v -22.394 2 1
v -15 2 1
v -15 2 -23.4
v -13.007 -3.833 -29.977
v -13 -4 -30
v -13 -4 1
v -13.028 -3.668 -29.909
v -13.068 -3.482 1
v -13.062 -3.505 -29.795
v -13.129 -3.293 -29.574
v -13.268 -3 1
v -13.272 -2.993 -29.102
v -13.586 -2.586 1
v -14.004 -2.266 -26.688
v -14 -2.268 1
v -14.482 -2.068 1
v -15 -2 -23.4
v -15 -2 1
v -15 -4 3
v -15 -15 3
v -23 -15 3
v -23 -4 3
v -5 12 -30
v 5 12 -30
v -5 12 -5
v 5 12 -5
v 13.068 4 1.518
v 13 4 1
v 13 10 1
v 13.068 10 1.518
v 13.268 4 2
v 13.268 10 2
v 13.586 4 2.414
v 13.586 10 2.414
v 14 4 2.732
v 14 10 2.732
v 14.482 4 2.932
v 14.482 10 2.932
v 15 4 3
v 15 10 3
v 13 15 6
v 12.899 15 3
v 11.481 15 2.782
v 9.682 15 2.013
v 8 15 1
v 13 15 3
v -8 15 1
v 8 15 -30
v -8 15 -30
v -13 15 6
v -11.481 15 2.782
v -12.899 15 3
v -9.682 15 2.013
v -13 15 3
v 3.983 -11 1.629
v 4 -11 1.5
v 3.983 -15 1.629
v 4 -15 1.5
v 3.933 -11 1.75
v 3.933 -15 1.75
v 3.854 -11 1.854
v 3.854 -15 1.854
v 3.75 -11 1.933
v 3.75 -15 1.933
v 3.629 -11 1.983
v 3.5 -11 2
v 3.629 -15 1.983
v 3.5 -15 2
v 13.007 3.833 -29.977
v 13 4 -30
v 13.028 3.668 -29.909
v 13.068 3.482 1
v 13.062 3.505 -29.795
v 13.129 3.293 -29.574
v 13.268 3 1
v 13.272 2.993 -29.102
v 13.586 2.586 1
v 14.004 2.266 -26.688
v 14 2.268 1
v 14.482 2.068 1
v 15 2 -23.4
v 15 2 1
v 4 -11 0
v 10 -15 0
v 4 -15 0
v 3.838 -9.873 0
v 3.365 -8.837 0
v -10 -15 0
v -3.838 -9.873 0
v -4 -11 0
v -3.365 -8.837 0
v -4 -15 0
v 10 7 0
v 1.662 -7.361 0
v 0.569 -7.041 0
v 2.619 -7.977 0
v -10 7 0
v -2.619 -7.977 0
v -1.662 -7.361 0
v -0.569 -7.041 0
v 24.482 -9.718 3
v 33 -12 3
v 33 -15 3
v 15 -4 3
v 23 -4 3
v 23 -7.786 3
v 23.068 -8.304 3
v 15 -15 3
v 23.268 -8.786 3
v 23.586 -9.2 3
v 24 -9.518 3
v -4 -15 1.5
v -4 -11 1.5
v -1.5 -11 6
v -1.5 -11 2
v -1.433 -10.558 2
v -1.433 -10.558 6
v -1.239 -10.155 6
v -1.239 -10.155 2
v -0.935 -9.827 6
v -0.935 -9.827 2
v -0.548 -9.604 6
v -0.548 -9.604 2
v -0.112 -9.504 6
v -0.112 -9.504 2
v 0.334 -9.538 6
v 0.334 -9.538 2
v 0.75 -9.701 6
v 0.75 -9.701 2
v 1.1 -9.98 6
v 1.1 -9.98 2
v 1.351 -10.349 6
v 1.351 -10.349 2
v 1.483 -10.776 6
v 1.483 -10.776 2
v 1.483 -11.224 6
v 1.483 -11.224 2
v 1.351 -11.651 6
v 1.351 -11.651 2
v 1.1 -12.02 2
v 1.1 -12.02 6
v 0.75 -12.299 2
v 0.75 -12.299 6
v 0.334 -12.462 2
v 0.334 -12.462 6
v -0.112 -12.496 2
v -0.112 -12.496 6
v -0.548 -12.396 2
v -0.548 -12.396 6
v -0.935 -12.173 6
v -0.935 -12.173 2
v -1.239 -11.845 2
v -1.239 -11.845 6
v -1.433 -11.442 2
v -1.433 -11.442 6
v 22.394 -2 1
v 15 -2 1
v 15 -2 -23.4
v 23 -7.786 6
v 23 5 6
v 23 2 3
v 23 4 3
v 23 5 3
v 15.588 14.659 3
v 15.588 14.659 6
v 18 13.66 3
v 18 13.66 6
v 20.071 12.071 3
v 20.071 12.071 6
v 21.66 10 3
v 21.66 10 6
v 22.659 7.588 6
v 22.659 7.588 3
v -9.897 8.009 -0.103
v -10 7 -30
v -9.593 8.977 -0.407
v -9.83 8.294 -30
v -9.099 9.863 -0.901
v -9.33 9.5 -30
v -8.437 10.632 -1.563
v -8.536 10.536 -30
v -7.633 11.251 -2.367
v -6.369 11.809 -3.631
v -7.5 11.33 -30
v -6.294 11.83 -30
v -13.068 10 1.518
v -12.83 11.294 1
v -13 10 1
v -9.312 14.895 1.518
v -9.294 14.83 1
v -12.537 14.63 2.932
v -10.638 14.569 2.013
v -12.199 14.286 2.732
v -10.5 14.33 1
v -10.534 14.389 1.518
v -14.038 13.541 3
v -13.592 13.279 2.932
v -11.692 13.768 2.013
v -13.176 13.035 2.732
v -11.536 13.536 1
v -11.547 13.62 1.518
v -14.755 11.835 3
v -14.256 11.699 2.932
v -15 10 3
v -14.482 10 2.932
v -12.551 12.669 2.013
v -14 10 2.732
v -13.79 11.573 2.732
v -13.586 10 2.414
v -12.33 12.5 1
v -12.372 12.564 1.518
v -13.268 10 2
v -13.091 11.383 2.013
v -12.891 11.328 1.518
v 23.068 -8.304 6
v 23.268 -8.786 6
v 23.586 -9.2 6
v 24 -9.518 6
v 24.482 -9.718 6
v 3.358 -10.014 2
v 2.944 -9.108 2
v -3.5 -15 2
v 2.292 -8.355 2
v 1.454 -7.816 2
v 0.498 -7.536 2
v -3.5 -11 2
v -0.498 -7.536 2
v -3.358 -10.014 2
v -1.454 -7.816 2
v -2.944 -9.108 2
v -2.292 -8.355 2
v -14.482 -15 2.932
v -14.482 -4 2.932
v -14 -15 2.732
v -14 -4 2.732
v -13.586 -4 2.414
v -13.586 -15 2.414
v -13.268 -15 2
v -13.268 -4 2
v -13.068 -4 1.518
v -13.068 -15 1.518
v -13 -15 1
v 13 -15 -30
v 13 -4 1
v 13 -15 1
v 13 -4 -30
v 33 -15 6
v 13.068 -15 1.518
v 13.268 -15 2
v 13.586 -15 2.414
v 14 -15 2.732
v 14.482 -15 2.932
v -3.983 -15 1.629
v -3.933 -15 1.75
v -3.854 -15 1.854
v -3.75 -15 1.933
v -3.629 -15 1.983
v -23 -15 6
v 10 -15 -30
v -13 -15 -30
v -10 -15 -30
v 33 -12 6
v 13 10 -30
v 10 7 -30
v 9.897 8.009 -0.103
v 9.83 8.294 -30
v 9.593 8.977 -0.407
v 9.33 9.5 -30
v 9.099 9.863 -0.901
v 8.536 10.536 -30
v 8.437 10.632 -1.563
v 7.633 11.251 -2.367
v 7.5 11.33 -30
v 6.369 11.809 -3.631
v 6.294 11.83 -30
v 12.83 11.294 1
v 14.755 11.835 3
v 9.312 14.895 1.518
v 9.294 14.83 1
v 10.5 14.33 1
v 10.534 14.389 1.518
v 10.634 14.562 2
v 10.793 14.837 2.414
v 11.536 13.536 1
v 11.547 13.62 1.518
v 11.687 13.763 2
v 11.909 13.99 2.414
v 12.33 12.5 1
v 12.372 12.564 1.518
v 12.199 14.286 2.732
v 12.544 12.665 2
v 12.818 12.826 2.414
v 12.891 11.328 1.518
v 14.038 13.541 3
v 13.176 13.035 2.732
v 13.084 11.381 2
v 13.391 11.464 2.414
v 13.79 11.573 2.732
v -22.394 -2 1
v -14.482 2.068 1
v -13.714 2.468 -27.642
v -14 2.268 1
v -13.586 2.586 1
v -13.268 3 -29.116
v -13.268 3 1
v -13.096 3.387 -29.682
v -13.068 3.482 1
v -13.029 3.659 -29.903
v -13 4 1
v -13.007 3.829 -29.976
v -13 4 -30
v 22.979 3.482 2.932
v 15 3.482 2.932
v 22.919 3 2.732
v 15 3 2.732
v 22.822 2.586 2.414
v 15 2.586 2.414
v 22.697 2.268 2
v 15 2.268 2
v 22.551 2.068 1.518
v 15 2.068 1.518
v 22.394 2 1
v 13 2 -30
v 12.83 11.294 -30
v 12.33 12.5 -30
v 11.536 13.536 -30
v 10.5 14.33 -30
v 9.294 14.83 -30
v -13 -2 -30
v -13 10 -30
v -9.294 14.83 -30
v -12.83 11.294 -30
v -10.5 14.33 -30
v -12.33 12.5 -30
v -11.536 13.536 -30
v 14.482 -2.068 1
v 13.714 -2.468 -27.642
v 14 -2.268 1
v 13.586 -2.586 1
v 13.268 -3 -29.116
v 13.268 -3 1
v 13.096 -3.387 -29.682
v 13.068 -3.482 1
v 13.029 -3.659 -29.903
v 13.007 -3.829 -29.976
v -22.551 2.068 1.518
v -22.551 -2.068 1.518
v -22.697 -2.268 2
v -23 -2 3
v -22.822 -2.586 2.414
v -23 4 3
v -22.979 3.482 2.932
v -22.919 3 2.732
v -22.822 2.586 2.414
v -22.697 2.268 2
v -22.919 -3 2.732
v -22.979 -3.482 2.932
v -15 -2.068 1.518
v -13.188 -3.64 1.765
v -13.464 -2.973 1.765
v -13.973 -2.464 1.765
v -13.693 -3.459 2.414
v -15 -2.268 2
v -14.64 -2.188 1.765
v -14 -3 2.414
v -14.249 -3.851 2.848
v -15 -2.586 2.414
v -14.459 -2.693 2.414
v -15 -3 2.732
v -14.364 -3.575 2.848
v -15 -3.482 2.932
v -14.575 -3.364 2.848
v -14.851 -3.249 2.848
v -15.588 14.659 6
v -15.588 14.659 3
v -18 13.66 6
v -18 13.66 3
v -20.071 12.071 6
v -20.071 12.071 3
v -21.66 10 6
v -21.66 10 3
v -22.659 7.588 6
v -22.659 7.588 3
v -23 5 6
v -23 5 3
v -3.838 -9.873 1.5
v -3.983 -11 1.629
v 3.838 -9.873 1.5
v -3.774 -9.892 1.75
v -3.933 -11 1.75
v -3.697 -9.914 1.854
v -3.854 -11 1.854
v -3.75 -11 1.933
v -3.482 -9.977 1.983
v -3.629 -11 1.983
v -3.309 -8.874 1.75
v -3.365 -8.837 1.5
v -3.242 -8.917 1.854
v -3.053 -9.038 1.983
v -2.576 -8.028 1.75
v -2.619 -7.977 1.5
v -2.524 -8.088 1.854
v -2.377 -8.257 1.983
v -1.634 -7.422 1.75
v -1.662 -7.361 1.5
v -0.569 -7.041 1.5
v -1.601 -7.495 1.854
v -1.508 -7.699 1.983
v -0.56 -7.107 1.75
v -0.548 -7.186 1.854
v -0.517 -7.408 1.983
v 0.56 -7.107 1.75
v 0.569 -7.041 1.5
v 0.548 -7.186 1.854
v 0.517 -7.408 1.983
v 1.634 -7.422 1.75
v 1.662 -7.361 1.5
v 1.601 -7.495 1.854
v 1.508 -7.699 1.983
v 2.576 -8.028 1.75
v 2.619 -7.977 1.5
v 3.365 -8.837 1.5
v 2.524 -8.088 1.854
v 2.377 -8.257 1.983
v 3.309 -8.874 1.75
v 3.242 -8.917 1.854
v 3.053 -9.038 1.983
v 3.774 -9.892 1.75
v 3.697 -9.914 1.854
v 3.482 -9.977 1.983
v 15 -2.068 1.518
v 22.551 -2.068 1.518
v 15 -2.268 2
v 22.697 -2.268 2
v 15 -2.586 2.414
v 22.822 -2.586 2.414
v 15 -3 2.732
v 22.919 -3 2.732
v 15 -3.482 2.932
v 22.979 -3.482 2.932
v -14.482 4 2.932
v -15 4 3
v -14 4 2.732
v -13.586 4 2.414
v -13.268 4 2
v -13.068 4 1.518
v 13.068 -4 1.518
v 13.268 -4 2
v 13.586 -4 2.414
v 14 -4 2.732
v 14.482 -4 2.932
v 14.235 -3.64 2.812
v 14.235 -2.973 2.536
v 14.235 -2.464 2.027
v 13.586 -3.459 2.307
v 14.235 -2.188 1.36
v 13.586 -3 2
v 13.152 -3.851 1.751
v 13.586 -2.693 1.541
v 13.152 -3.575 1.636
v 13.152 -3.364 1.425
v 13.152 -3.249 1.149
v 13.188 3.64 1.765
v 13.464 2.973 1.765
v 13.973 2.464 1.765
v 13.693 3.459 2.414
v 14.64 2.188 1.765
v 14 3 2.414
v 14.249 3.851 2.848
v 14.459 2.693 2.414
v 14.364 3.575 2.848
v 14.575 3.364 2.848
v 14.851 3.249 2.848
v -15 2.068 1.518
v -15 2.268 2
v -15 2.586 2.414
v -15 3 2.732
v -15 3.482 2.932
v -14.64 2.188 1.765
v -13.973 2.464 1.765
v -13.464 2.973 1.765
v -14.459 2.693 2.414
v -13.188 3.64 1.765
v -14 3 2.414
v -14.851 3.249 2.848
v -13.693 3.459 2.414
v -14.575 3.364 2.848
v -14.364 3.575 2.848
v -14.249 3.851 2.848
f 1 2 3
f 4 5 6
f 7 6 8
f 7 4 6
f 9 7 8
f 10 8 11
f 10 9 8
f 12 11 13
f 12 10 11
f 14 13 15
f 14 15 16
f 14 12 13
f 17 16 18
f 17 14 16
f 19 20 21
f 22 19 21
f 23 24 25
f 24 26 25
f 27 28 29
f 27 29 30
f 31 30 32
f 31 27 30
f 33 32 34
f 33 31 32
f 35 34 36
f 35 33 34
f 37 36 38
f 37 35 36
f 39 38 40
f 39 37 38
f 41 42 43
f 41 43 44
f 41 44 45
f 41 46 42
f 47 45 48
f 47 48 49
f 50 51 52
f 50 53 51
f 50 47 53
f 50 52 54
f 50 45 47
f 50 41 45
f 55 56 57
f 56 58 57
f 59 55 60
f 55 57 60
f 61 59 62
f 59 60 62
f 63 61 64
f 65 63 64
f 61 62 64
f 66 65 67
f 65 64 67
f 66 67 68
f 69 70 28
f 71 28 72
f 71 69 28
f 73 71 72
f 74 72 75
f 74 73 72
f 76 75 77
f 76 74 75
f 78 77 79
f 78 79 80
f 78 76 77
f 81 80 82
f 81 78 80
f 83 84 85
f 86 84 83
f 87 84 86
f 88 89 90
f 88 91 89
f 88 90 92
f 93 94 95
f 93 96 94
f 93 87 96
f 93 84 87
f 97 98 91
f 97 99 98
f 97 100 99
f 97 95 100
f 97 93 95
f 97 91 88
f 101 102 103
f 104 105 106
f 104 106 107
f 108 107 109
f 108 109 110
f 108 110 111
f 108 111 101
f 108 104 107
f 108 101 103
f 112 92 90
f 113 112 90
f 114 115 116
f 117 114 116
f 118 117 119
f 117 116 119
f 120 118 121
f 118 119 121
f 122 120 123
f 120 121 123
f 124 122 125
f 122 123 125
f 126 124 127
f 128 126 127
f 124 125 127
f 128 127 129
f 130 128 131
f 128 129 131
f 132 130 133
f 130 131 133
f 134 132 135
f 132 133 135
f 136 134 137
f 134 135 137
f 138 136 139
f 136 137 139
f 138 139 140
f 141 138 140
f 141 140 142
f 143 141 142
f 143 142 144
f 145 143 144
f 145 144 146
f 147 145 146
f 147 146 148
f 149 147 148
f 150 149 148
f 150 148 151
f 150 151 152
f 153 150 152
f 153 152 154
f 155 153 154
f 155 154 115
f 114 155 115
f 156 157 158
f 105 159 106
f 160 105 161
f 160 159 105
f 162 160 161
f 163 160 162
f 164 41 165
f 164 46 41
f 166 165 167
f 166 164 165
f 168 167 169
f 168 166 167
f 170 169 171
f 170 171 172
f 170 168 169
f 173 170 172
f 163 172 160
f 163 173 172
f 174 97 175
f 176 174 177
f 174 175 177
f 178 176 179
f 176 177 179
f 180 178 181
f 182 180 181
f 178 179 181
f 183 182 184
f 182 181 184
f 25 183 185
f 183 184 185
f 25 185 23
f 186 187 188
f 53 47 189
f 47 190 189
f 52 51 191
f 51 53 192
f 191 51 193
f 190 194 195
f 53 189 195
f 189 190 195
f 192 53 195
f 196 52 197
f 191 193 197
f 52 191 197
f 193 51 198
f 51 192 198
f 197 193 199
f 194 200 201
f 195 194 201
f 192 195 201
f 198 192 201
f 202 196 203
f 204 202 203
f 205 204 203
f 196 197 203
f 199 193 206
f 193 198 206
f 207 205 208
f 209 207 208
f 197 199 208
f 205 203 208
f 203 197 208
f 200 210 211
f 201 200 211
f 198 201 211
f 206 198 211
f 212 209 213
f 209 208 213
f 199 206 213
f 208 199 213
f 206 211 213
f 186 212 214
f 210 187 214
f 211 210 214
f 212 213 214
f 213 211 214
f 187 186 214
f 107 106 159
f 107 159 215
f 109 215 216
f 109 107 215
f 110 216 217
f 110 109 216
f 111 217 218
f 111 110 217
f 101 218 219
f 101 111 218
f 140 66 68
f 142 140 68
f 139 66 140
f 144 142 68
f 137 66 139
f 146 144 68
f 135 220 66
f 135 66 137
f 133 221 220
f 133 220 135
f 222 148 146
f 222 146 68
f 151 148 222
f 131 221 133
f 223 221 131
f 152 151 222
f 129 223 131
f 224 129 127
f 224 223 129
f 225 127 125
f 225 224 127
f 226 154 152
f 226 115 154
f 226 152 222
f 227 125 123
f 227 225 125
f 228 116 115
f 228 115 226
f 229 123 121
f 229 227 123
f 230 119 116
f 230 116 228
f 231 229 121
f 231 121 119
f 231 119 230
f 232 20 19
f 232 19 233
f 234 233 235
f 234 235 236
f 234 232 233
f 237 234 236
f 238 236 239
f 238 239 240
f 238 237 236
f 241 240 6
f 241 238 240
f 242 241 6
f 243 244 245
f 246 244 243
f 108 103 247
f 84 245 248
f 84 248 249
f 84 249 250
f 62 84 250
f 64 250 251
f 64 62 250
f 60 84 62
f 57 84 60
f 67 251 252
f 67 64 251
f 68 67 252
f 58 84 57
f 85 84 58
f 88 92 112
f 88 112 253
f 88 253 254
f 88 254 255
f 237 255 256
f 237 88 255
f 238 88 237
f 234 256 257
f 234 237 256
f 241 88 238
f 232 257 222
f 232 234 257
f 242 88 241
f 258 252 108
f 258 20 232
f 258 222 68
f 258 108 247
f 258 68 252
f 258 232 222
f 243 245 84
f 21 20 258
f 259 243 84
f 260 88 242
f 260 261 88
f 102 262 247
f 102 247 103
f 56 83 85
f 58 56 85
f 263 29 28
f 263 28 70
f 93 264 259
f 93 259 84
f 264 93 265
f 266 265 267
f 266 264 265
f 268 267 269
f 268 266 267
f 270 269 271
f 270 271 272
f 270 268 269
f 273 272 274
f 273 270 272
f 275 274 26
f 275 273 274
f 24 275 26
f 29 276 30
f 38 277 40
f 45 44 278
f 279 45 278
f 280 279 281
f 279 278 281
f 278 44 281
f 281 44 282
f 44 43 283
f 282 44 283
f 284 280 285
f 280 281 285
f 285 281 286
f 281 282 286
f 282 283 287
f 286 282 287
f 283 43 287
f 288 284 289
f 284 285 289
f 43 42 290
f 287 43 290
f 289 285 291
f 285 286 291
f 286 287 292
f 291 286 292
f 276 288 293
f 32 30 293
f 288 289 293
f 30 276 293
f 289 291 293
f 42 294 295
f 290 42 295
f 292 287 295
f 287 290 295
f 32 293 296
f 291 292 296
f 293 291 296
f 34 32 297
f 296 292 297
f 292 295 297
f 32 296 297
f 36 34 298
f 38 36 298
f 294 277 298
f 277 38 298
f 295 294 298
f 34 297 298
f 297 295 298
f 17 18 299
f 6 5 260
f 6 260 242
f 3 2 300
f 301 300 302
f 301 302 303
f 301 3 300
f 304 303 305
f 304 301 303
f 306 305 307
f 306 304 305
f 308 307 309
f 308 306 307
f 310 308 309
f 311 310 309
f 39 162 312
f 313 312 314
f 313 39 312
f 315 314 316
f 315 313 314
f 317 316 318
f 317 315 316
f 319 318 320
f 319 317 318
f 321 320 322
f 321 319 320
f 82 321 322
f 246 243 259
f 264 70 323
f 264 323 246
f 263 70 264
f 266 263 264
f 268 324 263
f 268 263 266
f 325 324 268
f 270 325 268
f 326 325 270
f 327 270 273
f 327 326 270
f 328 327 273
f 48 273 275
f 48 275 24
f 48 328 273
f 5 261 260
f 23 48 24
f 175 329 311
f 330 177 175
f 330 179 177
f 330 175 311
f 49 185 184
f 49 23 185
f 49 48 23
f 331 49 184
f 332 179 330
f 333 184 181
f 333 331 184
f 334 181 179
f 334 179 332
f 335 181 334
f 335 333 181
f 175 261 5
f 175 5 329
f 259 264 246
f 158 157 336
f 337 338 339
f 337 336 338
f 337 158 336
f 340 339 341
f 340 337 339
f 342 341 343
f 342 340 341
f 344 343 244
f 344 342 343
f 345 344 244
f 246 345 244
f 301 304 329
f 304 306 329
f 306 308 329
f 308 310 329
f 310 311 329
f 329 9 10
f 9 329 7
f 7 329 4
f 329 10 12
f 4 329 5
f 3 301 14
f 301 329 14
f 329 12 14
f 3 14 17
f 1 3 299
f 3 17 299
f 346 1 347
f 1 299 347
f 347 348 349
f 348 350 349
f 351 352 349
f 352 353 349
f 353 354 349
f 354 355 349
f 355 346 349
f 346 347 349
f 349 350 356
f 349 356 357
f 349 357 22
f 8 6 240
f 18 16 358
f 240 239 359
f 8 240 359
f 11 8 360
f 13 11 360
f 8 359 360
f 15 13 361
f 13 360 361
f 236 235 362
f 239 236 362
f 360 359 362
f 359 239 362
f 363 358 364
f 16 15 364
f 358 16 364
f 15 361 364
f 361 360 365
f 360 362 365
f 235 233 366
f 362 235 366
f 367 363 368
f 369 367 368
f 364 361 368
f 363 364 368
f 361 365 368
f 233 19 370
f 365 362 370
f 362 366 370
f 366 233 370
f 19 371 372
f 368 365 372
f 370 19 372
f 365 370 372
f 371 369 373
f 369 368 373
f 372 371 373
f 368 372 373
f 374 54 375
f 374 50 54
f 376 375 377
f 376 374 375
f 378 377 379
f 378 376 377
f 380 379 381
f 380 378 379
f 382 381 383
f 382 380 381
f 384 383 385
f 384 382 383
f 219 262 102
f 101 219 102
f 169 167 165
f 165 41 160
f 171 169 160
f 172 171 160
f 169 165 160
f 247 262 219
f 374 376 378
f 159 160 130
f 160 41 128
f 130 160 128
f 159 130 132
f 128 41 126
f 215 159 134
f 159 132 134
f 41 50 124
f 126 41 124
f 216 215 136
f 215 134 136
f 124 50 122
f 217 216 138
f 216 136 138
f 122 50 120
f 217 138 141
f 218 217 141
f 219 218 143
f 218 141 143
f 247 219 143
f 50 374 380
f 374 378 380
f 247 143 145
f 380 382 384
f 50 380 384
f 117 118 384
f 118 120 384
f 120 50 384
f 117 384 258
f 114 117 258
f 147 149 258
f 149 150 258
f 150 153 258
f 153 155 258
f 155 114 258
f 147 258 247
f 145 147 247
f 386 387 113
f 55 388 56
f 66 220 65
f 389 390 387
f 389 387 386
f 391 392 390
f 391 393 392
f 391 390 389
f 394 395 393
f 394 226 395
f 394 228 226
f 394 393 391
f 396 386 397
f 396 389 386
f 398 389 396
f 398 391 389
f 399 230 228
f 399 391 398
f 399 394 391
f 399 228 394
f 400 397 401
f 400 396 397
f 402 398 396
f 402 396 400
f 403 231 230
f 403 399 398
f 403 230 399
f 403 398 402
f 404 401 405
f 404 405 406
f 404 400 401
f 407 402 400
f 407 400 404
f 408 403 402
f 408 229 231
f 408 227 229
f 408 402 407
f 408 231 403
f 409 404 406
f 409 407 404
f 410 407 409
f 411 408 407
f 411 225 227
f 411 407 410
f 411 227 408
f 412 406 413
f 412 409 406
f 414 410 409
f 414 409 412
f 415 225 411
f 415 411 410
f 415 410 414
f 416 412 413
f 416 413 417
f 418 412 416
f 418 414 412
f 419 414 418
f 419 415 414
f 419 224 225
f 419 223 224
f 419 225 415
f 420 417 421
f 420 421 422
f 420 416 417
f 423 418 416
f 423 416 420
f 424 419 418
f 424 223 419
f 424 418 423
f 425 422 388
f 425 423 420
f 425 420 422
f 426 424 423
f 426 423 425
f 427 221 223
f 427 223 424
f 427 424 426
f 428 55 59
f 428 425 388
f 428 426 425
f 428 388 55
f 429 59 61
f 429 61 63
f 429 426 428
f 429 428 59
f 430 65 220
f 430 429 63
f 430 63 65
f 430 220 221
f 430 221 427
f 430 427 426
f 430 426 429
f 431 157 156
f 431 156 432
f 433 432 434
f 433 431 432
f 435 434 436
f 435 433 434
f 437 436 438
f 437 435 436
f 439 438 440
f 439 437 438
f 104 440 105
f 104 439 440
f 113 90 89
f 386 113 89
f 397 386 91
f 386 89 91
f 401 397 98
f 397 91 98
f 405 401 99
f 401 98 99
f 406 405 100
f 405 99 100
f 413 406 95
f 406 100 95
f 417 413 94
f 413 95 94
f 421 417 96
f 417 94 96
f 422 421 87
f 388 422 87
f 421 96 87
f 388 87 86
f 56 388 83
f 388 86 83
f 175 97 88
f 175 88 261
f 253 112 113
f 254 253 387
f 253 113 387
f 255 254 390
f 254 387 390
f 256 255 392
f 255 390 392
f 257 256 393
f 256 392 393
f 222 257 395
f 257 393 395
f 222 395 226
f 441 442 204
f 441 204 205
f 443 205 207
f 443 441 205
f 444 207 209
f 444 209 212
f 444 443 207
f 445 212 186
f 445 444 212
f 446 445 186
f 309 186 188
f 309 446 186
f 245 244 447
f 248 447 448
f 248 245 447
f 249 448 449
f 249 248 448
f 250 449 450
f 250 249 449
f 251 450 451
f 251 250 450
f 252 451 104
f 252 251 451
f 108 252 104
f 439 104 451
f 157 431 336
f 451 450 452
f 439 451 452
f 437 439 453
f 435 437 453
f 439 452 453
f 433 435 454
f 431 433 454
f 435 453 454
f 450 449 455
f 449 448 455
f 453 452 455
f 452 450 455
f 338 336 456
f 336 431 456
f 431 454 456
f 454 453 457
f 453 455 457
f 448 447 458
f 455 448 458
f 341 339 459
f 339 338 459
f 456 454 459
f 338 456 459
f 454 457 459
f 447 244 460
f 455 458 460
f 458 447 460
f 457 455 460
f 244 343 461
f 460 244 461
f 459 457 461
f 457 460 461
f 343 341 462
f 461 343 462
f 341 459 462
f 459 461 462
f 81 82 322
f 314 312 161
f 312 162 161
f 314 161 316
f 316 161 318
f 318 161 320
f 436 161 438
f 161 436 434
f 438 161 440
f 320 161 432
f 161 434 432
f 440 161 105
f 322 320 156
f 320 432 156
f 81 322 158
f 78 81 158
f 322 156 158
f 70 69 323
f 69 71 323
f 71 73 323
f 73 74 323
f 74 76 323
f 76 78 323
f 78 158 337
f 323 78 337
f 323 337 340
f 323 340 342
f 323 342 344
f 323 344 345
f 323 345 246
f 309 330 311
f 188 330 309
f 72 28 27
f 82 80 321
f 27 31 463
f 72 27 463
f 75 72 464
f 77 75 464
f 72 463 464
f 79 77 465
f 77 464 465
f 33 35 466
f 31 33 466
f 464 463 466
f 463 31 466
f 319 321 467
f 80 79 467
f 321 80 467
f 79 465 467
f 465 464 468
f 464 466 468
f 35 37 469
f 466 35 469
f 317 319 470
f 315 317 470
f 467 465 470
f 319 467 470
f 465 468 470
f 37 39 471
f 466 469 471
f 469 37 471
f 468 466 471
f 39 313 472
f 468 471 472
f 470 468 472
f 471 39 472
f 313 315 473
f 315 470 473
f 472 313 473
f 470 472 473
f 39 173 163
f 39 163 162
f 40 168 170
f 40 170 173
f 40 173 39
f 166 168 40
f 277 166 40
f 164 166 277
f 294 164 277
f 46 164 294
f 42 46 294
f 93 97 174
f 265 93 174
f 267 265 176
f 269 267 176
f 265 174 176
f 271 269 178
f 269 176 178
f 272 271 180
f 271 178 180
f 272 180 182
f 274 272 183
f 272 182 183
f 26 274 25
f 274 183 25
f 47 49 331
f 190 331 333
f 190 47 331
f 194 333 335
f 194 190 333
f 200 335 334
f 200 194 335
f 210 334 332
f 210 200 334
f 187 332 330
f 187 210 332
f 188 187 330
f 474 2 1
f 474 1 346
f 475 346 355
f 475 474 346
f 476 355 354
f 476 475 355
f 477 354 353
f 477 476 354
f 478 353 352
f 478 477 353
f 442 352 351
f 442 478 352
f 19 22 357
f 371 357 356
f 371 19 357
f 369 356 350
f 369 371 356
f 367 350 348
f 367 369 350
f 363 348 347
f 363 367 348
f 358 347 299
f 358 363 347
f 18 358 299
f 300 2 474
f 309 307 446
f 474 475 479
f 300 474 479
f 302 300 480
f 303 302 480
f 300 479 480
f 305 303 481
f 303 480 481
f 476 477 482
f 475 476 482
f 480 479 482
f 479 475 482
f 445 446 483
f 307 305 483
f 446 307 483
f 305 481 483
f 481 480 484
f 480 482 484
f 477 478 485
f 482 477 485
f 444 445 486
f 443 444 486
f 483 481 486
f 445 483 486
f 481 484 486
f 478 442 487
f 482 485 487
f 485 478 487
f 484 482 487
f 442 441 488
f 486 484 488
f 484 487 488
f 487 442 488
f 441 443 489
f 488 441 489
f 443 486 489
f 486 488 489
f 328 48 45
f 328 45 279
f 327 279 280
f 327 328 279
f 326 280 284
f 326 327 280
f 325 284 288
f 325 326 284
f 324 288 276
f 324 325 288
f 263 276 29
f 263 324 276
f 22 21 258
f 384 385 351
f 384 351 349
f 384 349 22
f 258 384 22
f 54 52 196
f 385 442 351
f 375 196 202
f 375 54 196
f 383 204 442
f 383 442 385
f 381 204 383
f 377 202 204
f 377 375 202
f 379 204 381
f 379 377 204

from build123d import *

# Parameters (mm, degrees)
BOSS_EXTRUDE1_DEPTH = 15
BOSS_EXTRUDE2_DEPTH = 2
SKETCH3_R           = 1.5
CUT_EXTRUDE1_DEPTH  = 41.669398815
FILLET1_R           = 10
CUT_EXTRUDE4_DEPTH  = 2
FILLET2_R           = 0.5
SKETCH5_W           = 20
SKETCH5_H           = 3
BOSS_EXTRUDE3_DEPTH = 30
SKETCH6_W           = 3
SKETCH6_H           = 3
BOSS_EXTRUDE4_DEPTH = 10
CHAMFER1_SIZE2      = 10
CHAMFER1_SIZE       = 2.679491924
FILLET3_R           = 5
FILLET4_R           = 2


# Some blends are built 0.0001 mm under size
with BuildPart() as part:
    # Sketch1 → Boss-Extrude1 (new, symmetric)
    with BuildSketch(Plane(origin=(0, 0, 0), x_dir=(1, 0, 0), z_dir=(0, 1, 0))):
        Polygon((10, 0), (-10, 0), (-10, 30), (-13, 30), (-13, -3), (-23, -3), (-23, -6), (23, -6), (23, -3), (13, -3), (13, 30), (10, 30), align=None)
    extrude(amount=BOSS_EXTRUDE1_DEPTH, both=True)

    # Sketch2 → Boss-Extrude2 (add, symmetric)
    with BuildSketch(Plane(origin=(0, 0, 0), x_dir=(1, 0, 0), z_dir=(0, 1, 0))):
        Polygon((13, 30), (13, -3), (23, -3), align=None)
    boss_extrude2 = extrude(amount=BOSS_EXTRUDE2_DEPTH, both=True)

    # Mirror1: Boss-Extrude2 across plane
    add(boss_extrude2.mirror(Plane(origin=(0, 0, 0), x_dir=(0, 0, 1), z_dir=(1, 0, 0))))

    # Sketch3 → Cut-Extrude1 (cut, through all)
    with BuildSketch(Plane(origin=(0, 0, 0), x_dir=(-1, 0, 0), z_dir=(0, 0, -1))):
        with Locations((0, -11)):
            Circle(SKETCH3_R)
    extrude(amount=-CUT_EXTRUDE1_DEPTH, mode=Mode.SUBTRACT)

    # Fillet1
    fillet1_edges = [part.edges().sort_by_distance(p)[0] for p in [
        (23, 15, 4.5),
        (-23, 15, 4.5),
    ]]
    fillet(fillet1_edges, radius=FILLET1_R)

    # Sketch4 → Cut-Extrude4 (cut)
    with BuildSketch(Plane(origin=(0, 0, 0), x_dir=(-1, 0, 0), z_dir=(0, 0, -1))):
        with BuildLine():
            Line((0, -15), (4, -15))
            Line((4, -15), (4, -11))
            ThreePointArc((4, -11), (0, -7), (-4, -11))
            Line((-4, -11), (-4, -15))
            Line((-4, -15), (0, -15))
        make_face()
    extrude(amount=-CUT_EXTRUDE4_DEPTH, mode=Mode.SUBTRACT)

    # Fillet2
    fillet2_edges = [part.edges().sort_by_distance(p)[0] for p in [
        (4, -13, 2),
        (0, -7, 2),
        (-4, -13, 2),
    ]]
    fillet(fillet2_edges, radius=FILLET2_R)

    # Sketch5 → Boss-Extrude3 (add)
    with BuildSketch(Plane(origin=(0, 0, 0), x_dir=(-1, 0, 0), z_dir=(0, 0, -1))):
        with Locations((0, 13.5)):
            Rectangle(SKETCH5_W, SKETCH5_H)
    extrude(amount=BOSS_EXTRUDE3_DEPTH)

    # Sketch6 → Boss-Extrude4 (add)
    with BuildSketch(Plane(origin=(23, 0, 0), x_dir=(0, 0, -1), z_dir=(1, 0, 0))):
        with Locations((-4.5, -13.5)):
            Rectangle(SKETCH6_W, SKETCH6_H)
    extrude(amount=BOSS_EXTRUDE4_DEPTH)

    # Chamfer1
    chamfer1_edges = [part.edges().sort_by_distance(p)[0] for p in [
        (23, -12, 4.5),
    ]]
    chamfer1_side = [part.faces().sort_by_distance(p)[0] for p in [
        (23, -11.946410162, 4.5),
    ]]
    chamfer(chamfer1_edges, length=CHAMFER1_SIZE - 0.0001, length2=CHAMFER1_SIZE2 - 0.0001, reference=chamfer1_side[0])  # a hair under: the kernel refuses the full size

    # Fillet3
    fillet3_edges = [part.edges().sort_by_distance(p)[0] for p in [
        (10, 12, -15),
        (0, 12, 0),
        (-10, 12, -15),
        (13, 15, -13.5),
        (-13, 15, -13.5),
    ]]
    fillet(fillet3_edges, radius=FILLET3_R)

    # Fillet4
    # the kernel refuses this fillet: 2 mm, written as the material it adds along each edge
    with BuildSketch(Plane(origin=(-15, 4, 1), x_dir=(0, -1, 0), z_dir=(0, 0, 1))) as fillet4_piece_1_section:
        Polygon((0, 0), (FILLET4_R * 1.02, 0), (FILLET4_R * 1.02, FILLET4_R * 1.02), (0, FILLET4_R * 1.02), align=None)
    fillet4_piece_1 = extrude(amount=FILLET4_R * 1.02, mode=Mode.PRIVATE)
    fillet4_piece_1 = fillet4_piece_1 - Plane(origin=(-15, 4, 1), x_dir=(-0.7071067811865475, 0.7071067811865475, 0), z_dir=(0, 0, 1)) * Sphere(FILLET4_R, mode=Mode.PRIVATE)
    add(fillet4_piece_1)
    with BuildSketch(Plane(origin=(15, 4, 1), x_dir=(-1, 0, 0), z_dir=(0, 0, 1))) as fillet4_piece_2_section:
        Polygon((0, 0), (FILLET4_R * 1.02, 0), (FILLET4_R * 1.02, FILLET4_R * 1.02), (0, FILLET4_R * 1.02), align=None)
    fillet4_piece_2 = extrude(amount=FILLET4_R * 1.02, mode=Mode.PRIVATE)
    fillet4_piece_2 = fillet4_piece_2 - Plane(origin=(15, 4, 1), x_dir=(0.7071067811865475, 0.7071067811865475, 0), z_dir=(0, 0, 1)) * Sphere(FILLET4_R, mode=Mode.PRIVATE)
    add(fillet4_piece_2)
    with BuildSketch(Plane(origin=(15, -4, 1), x_dir=(0, 1, 0), z_dir=(-1, 0, 0))) as fillet4_piece_3_section:
        Polygon((0, 0), (FILLET4_R * 1.02, 0), (FILLET4_R * 1.02, -FILLET4_R * 1.02), (0, -FILLET4_R * 1.02), align=None)
    fillet4_piece_3 = extrude(amount=FILLET4_R * 1.02, mode=Mode.PRIVATE)
    fillet4_piece_3 = fillet4_piece_3 - Plane(origin=(15, -4, 1), x_dir=(0, -0.7071067811865475, -0.7071067811865475), z_dir=(-1, 0, 0)) * Sphere(FILLET4_R, mode=Mode.PRIVATE)
    add(fillet4_piece_3)
    with BuildSketch(Plane(origin=(-15, -4, 1), x_dir=(1, 0, 0), z_dir=(0, 0, 1))) as fillet4_piece_4_section:
        Polygon((0, 0), (FILLET4_R * 1.02, 0), (FILLET4_R * 1.02, FILLET4_R * 1.02), (0, FILLET4_R * 1.02), align=None)
    fillet4_piece_4 = extrude(amount=FILLET4_R * 1.02, mode=Mode.PRIVATE)
    fillet4_piece_4 = fillet4_piece_4 - Plane(origin=(-15, -4, 1), x_dir=(-0.7071067811865475, -0.7071067811865475, 0), z_dir=(0, 0, 1)) * Sphere(FILLET4_R, mode=Mode.PRIVATE)
    add(fillet4_piece_4)
    with BuildSketch(Plane(origin=(23, -9.320608076, 3), x_dir=(0, 1, 0), z_dir=(0, 0, 1))) as fillet4_piece_5:
        with BuildLine():
            CenterArc((FILLET4_R * 0.767332413902, -FILLET4_R), FILLET4_R, 90, 75.000391344)
            Line((-FILLET4_R * 0.19859518016, -FILLET4_R * 0.741187552406), (0, 0))
            Line((0, 0), (FILLET4_R * 0.767332413902, 0))
        make_face()
    extrude(amount=3)
    with BuildSketch(Plane(origin=(-13, 4, 3), x_dir=(-1, 0, 0), z_dir=(0, 1, 0))) as fillet4_piece_6:
        with BuildLine():
            CenterArc((FILLET4_R, -FILLET4_R), FILLET4_R, 90, 90)
            Line((0, -FILLET4_R), (0, 0))
            Line((0, 0), (FILLET4_R, 0))
        make_face()
    extrude(amount=6)
    with BuildSketch(Plane(origin=(13, 4, 3), x_dir=(1, 0, 0), z_dir=(0, 1, 0))) as fillet4_piece_7:
        with BuildLine():
            CenterArc((FILLET4_R, FILLET4_R), FILLET4_R, 180, 90)
            Line((0, FILLET4_R), (0, 0))
            Line((0, 0), (FILLET4_R, 0))
        make_face()
    extrude(amount=6)
    with BuildSketch(Plane(origin=(-8, 10, 3), x_dir=(0.8416879607506225, 0.5399642365263265, 0), z_dir=(0.5399642365263265, -0.8416879607506225, 0))) as fillet4_piece_8_section:
        with BuildLine():
            CenterArc((5 + FILLET4_R, -FILLET4_R), FILLET4_R, 90, 90)
            Line((5 + FILLET4_R, 0), (5, 0))
            Line((5, 0), (5, -FILLET4_R))
        make_face()
    fillet4_piece_8 = revolve(axis=Axis((-8, 10, 3), (0, 0, 1)), revolution_arc=147.318795695, mode=Mode.PRIVATE)
    fillet4_piece_8 = split(fillet4_piece_8, bisect_by=Plane(origin=(-11.613068515, 15, 2.473069622), z_dir=(0, -1, 0)), keep=Keep.TOP, mode=Mode.PRIVATE)
    add(fillet4_piece_8)
    with BuildSketch(Plane(origin=(8, 10, 3), x_dir=(-0.8416879607506222, 0.5399642365263269, 0), z_dir=(-0.5399642365263269, -0.8416879607506222, 0))) as fillet4_piece_9_section:
        with BuildLine():
            CenterArc((5 + FILLET4_R, FILLET4_R), FILLET4_R, 180, 90)
            Line((5, FILLET4_R), (5, 0))
            Line((5, 0), (5 + FILLET4_R, 0))
        make_face()
    fillet4_piece_9 = revolve(axis=Axis((8, 10, 3), (0, 0, -1)), revolution_arc=147.318795695, mode=Mode.PRIVATE)
    fillet4_piece_9 = split(fillet4_piece_9, bisect_by=Plane(origin=(11.613076931, 15, 2.472895292), z_dir=(0, -1, 0)), keep=Keep.TOP, mode=Mode.PRIVATE)
    add(fillet4_piece_9)
    with BuildSketch(Plane(origin=(13, -15, 3), x_dir=(1, 0, 0), z_dir=(0, 1, 0)), Plane(origin=(-13, -15, 3), x_dir=(0, 0, -1), z_dir=(0, 1, 0))) as fillet4_piece_10:
        with BuildLine():
            CenterArc((FILLET4_R, FILLET4_R), FILLET4_R, 180, 90)
            Line((0, FILLET4_R), (0, 0))
            Line((0, 0), (FILLET4_R, 0))
        make_face()
    extrude(amount=11)
    with BuildSketch(Plane(origin=(13, -2, -35), x_dir=(0, -1, 0), z_dir=(0, 0, 1))) as fillet4_piece_11_section:
        with BuildLine():
            CenterArc((FILLET4_R, FILLET4_R), FILLET4_R, 180, 90)
            Line((0, FILLET4_R), (0, 0))
            Line((0, 0), (FILLET4_R, 0))
        make_face()
    fillet4_piece_11 = extrude(amount=36, mode=Mode.PRIVATE)
    fillet4_piece_11 = split(fillet4_piece_11, bisect_by=Plane(origin=(17.53556841, -2.455982706, -15.032624248), z_dir=(-0.9570244044334736, 0, 0.29000739528287095)), keep=Keep.TOP, mode=Mode.PRIVATE)
    add(fillet4_piece_11)
    with BuildSketch(Plane(origin=(15, -2, 3), x_dir=(0, -1, 0), z_dir=(1, 0, 0))) as fillet4_piece_12_section:
        with BuildLine():
            CenterArc((FILLET4_R, FILLET4_R), FILLET4_R, 180, 90)
            Line((0, FILLET4_R), (0, 0))
            Line((0, 0), (FILLET4_R, 0))
        make_face()
    fillet4_piece_12 = extrude(amount=13, mode=Mode.PRIVATE)
    fillet4_piece_12 = split(fillet4_piece_12, bisect_by=Plane(origin=(22.535474122, -2.449923656, 1.467064601), z_dir=(-0.9570244044334736, 0, 0.29000739528287095)), keep=Keep.TOP, mode=Mode.PRIVATE)
    add(fillet4_piece_12)
    with BuildSketch(Plane(origin=(13, 2, -35), x_dir=(0, 1, 0), z_dir=(0, 0, 1))) as fillet4_piece_13_section:
        with BuildLine():
            CenterArc((FILLET4_R, -FILLET4_R), FILLET4_R, 90, 90)
            Line((0, -FILLET4_R), (0, 0))
            Line((0, 0), (FILLET4_R, 0))
        make_face()
    fillet4_piece_13 = extrude(amount=36, mode=Mode.PRIVATE)
    fillet4_piece_13 = split(fillet4_piece_13, bisect_by=Plane(origin=(17.53556841, 2.455982706, -15.032624248), z_dir=(-0.9570244044334736, 0, 0.29000739528287095)), keep=Keep.TOP, mode=Mode.PRIVATE)
    add(fillet4_piece_13)
    with BuildSketch(Plane(origin=(15, 2, 3), x_dir=(0, 1, 0), z_dir=(1, 0, 0))) as fillet4_piece_14_section:
        with BuildLine():
            CenterArc((FILLET4_R, -FILLET4_R), FILLET4_R, 90, 90)
            Line((0, -FILLET4_R), (0, 0))
            Line((0, 0), (FILLET4_R, 0))
        make_face()
    fillet4_piece_14 = extrude(amount=13, mode=Mode.PRIVATE)
    fillet4_piece_14 = split(fillet4_piece_14, bisect_by=Plane(origin=(22.535474122, 2.449923656, 1.467064601), z_dir=(-0.9570244044334736, 0, 0.29000739528287095)), keep=Keep.TOP, mode=Mode.PRIVATE)
    add(fillet4_piece_14)
    with BuildSketch(Plane(origin=(-15, 2, 3), x_dir=(0, 1, 0), z_dir=(-1, 0, 0))) as fillet4_piece_15_section:
        with BuildLine():
            CenterArc((FILLET4_R, FILLET4_R), FILLET4_R, 180, 90)
            Line((0, FILLET4_R), (0, 0))
            Line((0, 0), (FILLET4_R, 0))
        make_face()
    fillet4_piece_15 = extrude(amount=13, mode=Mode.PRIVATE)
    fillet4_piece_15 = split(fillet4_piece_15, bisect_by=Plane(origin=(-22.535474122, 2.449923656, 1.467064601), z_dir=(0.9570244044334736, 0, 0.29000739528287095)), keep=Keep.TOP, mode=Mode.PRIVATE)
    add(fillet4_piece_15)
    with BuildSketch(Plane(origin=(-13, 2, -35), x_dir=(0, 1, 0), z_dir=(0, 0, 1))) as fillet4_piece_16_section:
        with BuildLine():
            CenterArc((FILLET4_R, FILLET4_R), FILLET4_R, 180, 90)
            Line((0, FILLET4_R), (0, 0))
            Line((0, 0), (FILLET4_R, 0))
        make_face()
    fillet4_piece_16 = extrude(amount=36, mode=Mode.PRIVATE)
    fillet4_piece_16 = split(fillet4_piece_16, bisect_by=Plane(origin=(-17.53556841, 2.455982706, -15.032624248), z_dir=(0.9570244044334736, 0, 0.29000739528287095)), keep=Keep.TOP, mode=Mode.PRIVATE)
    add(fillet4_piece_16)
    with BuildSketch(Plane(origin=(-13, -2, -35), x_dir=(0, -1, 0), z_dir=(0, 0, 1))) as fillet4_piece_17_section:
        with BuildLine():
            CenterArc((FILLET4_R, -FILLET4_R), FILLET4_R, 90, 90)
            Line((0, -FILLET4_R), (0, 0))
            Line((0, 0), (FILLET4_R, 0))
        make_face()
    fillet4_piece_17 = extrude(amount=36, mode=Mode.PRIVATE)
    fillet4_piece_17 = split(fillet4_piece_17, bisect_by=Plane(origin=(-17.53556841, -2.455982706, -15.032624248), z_dir=(0.9570244044334736, 0, 0.29000739528287095)), keep=Keep.TOP, mode=Mode.PRIVATE)
    add(fillet4_piece_17)
    with BuildSketch(Plane(origin=(-15, -2, 3), x_dir=(0, -1, 0), z_dir=(-1, 0, 0))) as fillet4_piece_18_section:
        with BuildLine():
            CenterArc((FILLET4_R, -FILLET4_R), FILLET4_R, 90, 90)
            Line((0, -FILLET4_R), (0, 0))
            Line((0, 0), (FILLET4_R, 0))
        make_face()
    fillet4_piece_18 = extrude(amount=13, mode=Mode.PRIVATE)
    fillet4_piece_18 = split(fillet4_piece_18, bisect_by=Plane(origin=(-22.535474122, -2.449923656, 1.467064601), z_dir=(0.9570244044334736, 0, 0.29000739528287095)), keep=Keep.TOP, mode=Mode.PRIVATE)
    add(fillet4_piece_18)


solid = part.part
